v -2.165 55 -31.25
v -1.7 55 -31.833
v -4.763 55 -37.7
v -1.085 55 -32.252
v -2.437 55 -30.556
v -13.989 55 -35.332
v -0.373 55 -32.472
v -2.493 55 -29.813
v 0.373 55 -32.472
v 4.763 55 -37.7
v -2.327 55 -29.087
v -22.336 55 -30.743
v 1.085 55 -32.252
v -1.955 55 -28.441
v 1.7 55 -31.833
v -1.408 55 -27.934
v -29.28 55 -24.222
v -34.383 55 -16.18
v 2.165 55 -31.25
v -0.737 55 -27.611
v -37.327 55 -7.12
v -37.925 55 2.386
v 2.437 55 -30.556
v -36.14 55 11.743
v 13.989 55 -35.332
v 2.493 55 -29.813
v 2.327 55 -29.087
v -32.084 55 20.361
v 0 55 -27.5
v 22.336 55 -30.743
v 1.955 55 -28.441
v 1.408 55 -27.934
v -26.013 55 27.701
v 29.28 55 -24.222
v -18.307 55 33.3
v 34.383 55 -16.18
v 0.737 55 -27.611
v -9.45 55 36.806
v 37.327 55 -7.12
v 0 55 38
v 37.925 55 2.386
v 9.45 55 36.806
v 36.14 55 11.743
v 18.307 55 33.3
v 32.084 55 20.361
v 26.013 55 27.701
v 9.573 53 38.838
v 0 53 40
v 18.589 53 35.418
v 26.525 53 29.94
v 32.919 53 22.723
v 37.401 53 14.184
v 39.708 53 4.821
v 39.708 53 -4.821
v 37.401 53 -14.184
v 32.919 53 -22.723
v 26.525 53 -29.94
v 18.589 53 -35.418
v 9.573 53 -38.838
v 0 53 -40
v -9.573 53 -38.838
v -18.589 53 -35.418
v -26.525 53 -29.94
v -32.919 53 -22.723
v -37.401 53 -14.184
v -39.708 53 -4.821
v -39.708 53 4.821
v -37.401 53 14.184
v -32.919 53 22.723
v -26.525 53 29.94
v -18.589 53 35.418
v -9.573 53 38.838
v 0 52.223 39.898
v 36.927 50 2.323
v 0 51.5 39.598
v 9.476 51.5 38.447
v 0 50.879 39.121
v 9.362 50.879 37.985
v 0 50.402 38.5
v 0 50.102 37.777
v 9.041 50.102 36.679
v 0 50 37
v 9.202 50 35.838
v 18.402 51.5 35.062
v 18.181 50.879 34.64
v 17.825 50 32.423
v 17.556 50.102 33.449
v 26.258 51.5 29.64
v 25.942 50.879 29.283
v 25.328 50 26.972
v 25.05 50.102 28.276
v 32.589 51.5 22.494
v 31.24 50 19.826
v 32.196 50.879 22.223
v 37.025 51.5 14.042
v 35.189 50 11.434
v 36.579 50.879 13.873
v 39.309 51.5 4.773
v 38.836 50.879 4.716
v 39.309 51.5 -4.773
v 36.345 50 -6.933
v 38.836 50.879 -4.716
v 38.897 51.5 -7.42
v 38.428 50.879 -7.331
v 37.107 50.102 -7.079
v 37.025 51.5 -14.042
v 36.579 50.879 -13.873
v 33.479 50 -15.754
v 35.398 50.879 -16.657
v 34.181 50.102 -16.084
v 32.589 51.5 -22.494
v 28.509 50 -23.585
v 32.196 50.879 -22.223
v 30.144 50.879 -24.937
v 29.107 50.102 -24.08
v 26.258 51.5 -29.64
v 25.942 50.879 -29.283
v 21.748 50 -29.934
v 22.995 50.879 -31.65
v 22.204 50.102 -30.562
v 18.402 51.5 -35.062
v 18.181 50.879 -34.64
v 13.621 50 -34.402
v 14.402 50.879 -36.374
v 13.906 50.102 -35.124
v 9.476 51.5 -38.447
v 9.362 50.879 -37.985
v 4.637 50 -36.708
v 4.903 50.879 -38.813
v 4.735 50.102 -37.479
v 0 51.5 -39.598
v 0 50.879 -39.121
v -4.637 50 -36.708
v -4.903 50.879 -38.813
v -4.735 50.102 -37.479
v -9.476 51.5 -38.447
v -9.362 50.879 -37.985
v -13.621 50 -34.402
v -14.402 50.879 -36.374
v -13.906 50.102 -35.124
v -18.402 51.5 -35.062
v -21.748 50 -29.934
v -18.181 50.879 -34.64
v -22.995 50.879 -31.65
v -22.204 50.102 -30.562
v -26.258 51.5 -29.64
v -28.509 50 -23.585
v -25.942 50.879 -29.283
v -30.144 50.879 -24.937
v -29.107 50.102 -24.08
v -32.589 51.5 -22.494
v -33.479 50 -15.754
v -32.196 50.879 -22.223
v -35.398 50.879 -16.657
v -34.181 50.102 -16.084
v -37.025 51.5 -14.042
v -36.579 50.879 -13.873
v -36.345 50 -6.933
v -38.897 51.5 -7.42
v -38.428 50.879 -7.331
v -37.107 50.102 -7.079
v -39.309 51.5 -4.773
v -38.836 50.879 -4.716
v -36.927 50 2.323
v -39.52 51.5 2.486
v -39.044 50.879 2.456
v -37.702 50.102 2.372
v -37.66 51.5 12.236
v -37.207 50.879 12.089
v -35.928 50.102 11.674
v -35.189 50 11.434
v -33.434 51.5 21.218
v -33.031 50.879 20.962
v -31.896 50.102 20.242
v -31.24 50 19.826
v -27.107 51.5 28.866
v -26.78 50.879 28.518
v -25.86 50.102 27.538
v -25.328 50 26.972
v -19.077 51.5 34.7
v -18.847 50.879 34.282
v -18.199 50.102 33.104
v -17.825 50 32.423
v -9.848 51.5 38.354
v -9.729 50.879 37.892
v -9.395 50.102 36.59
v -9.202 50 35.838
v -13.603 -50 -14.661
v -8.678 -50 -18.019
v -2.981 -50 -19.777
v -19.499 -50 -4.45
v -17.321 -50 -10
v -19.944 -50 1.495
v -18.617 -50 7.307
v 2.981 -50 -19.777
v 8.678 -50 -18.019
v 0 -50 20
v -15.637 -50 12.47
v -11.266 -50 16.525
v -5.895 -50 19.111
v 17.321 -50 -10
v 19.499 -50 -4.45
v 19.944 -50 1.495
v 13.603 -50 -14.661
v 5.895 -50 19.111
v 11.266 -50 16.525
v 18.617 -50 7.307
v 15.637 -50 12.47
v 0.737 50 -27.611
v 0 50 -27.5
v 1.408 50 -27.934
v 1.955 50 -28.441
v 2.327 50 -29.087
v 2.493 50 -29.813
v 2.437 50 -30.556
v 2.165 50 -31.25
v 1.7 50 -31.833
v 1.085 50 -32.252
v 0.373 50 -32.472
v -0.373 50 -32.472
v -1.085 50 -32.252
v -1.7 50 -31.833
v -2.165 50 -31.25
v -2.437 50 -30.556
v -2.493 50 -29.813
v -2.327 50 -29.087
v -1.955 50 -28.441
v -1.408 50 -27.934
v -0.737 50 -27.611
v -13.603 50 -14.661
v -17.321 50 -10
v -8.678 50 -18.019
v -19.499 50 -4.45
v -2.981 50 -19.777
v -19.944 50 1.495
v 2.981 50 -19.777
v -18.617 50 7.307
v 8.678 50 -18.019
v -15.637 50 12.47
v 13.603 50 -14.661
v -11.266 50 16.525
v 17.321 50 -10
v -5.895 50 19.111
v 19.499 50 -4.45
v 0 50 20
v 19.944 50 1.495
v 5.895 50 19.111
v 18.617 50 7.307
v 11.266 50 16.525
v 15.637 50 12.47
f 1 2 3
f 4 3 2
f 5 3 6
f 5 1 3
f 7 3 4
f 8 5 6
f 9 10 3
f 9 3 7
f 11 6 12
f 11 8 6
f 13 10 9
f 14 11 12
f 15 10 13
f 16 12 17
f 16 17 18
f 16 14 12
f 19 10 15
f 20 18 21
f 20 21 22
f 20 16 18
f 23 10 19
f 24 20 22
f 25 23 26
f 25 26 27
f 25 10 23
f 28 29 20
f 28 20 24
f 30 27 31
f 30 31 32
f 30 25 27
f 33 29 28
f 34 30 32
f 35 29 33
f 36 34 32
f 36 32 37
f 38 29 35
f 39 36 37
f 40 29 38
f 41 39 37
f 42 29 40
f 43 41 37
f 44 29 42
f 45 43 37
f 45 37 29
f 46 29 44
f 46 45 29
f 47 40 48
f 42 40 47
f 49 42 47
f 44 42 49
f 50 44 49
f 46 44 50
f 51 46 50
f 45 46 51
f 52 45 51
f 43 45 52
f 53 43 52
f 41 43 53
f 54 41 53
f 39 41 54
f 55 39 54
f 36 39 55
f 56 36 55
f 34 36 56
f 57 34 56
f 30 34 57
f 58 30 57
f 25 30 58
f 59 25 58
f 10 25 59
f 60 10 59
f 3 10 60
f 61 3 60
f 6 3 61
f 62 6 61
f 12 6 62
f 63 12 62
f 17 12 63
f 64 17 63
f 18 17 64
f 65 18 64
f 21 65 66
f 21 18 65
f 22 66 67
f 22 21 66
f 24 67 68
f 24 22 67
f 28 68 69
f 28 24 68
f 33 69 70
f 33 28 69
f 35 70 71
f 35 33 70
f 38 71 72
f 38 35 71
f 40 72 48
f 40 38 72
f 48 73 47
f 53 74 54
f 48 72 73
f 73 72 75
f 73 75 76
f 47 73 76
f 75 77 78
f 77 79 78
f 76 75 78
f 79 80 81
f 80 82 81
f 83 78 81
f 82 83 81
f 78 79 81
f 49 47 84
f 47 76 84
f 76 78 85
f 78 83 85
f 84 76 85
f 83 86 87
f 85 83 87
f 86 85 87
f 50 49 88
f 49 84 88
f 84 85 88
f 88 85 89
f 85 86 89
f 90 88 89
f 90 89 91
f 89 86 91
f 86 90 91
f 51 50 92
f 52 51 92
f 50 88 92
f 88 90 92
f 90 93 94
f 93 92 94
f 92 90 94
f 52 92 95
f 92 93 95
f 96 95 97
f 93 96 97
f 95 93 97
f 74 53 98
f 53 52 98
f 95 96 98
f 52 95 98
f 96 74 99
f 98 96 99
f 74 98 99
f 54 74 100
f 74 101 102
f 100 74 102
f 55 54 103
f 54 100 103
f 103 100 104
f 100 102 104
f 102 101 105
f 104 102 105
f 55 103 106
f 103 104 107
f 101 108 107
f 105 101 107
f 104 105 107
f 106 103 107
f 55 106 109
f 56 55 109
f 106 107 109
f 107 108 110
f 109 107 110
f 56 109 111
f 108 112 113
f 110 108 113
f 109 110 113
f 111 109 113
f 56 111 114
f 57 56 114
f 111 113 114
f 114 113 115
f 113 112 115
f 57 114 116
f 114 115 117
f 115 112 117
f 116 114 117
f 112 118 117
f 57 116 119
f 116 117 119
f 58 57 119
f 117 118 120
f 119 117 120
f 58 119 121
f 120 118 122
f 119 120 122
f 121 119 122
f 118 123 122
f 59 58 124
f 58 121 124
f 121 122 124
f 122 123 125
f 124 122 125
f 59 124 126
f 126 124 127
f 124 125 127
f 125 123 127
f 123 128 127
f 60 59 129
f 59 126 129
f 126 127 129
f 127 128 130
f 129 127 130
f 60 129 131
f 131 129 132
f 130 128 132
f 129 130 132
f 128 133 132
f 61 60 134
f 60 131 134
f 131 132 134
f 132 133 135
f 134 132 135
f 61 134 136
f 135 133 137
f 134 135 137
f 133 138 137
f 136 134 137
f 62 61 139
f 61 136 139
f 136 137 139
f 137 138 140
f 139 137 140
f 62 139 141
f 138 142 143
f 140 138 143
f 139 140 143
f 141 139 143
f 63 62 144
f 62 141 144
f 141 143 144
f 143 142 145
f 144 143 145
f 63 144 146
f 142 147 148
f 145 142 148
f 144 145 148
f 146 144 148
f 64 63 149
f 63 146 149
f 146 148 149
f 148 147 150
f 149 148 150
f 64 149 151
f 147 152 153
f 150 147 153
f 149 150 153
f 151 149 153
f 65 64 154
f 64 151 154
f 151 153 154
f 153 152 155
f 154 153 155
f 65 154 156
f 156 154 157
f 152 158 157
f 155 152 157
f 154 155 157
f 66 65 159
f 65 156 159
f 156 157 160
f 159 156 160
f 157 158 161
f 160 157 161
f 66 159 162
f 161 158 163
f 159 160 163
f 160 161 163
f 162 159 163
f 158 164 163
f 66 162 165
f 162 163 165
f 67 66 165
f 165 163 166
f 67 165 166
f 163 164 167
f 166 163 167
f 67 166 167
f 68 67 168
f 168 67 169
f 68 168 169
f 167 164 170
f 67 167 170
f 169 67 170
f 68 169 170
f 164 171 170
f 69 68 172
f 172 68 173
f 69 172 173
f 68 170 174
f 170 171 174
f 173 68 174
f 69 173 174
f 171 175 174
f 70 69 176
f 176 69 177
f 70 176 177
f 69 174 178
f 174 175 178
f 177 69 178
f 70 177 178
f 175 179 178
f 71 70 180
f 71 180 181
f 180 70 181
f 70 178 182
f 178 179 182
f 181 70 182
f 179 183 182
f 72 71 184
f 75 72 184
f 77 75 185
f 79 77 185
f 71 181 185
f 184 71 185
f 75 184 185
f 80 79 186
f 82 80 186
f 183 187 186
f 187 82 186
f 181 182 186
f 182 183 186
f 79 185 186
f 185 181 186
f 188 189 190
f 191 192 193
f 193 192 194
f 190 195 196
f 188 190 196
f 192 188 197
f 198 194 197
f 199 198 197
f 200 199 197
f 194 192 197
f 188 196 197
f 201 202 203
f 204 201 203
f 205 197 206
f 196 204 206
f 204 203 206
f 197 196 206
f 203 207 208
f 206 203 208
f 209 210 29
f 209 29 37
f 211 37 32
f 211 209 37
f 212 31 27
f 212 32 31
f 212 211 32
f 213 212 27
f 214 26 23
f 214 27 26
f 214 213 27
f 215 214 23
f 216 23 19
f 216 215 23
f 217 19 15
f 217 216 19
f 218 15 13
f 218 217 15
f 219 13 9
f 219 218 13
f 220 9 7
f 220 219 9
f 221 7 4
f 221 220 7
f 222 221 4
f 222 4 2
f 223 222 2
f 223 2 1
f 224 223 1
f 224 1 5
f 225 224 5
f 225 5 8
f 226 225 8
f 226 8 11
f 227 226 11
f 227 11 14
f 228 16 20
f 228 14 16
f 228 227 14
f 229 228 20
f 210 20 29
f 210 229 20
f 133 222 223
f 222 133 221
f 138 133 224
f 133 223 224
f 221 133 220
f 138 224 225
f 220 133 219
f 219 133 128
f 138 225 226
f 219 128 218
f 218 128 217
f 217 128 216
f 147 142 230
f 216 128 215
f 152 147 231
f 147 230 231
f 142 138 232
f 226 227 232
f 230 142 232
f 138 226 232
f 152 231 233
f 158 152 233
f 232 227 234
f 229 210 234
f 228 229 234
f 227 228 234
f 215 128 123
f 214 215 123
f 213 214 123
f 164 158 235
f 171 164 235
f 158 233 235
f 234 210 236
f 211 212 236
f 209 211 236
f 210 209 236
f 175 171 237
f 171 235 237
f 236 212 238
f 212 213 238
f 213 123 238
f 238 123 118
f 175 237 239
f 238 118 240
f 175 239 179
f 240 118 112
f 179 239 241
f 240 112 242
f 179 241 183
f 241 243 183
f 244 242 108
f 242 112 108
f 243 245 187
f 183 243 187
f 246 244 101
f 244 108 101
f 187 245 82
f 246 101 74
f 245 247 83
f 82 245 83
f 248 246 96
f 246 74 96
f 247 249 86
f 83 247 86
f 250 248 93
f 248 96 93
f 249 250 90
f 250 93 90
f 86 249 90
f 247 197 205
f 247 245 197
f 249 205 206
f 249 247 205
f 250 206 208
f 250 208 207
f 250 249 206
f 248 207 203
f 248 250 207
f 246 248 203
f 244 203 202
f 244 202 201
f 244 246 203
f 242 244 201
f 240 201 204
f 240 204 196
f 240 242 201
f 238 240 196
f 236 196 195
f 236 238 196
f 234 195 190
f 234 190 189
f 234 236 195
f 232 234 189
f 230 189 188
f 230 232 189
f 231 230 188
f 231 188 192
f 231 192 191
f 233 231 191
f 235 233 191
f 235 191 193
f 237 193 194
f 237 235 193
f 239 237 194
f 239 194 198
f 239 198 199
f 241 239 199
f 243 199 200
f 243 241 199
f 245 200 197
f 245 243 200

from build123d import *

# Parameters (mm, degrees)
SKETCH1_R               = 20
BOSS_EXTRUDE1_DEPTH     = 50
SKETCH3_R               = 40
BOSS_EXTRUDE2_DEPTH     = 5
CHAMFER1_SIZE           = 2
CUT_EXTRUDE1_DEPTH      = 120.268604419
CUT_EXTRUDE1_DEPTH_BACK = 120.268604419
SKETCH4_R               = 2.5
FILLET1_R               = 3


with BuildPart() as part:
    # Sketch1 → Boss-Extrude1 (new, symmetric)
    with BuildSketch(Plane(origin=(0, 0, 0), x_dir=(1, 0, 0), z_dir=(0, 1, 0))):
        with Locations(Location((0, 0, 0), (0, 0, 270))):
            Circle(SKETCH1_R)
    extrude(amount=BOSS_EXTRUDE1_DEPTH, both=True)

    # Sketch3 → Boss-Extrude2 (add)
    with BuildSketch(Plane(origin=(0, 50, 0), x_dir=(1, 0, 0), z_dir=(0, 1, 0))):
        with Locations(Location((0, 0, 0), (0, 0, 270))):
            Circle(SKETCH3_R)
    extrude(amount=BOSS_EXTRUDE2_DEPTH)

    # Chamfer1
    chamfer1_edges = [part.edges().sort_by_distance(p)[0] for p in [
        (0, 55, -40),
    ]]
    chamfer(chamfer1_edges, length=CHAMFER1_SIZE)

    # Sketch4 → Cut-Extrude1 (cut, two sides: drawn at the far end of the back side and taken through both)
    with BuildSketch(Plane(origin=(0, 55, 0), x_dir=(1, 0, 0), z_dir=(0, 1, 0)).offset(-CUT_EXTRUDE1_DEPTH_BACK)):
        with Locations(Location((0, 30, 0), (0, 0, 270))):
            Circle(SKETCH4_R)
    extrude(amount=CUT_EXTRUDE1_DEPTH + CUT_EXTRUDE1_DEPTH_BACK, mode=Mode.SUBTRACT)

    # Fillet1
    fillet1_edges = [part.edges().sort_by_distance(p)[0] for p in [
        (0, 50, -40),
    ]]
    fillet(fillet1_edges, radius=FILLET1_R - 0.0001)  # a hair under: the kernel refuses the full size


solid = part.part
